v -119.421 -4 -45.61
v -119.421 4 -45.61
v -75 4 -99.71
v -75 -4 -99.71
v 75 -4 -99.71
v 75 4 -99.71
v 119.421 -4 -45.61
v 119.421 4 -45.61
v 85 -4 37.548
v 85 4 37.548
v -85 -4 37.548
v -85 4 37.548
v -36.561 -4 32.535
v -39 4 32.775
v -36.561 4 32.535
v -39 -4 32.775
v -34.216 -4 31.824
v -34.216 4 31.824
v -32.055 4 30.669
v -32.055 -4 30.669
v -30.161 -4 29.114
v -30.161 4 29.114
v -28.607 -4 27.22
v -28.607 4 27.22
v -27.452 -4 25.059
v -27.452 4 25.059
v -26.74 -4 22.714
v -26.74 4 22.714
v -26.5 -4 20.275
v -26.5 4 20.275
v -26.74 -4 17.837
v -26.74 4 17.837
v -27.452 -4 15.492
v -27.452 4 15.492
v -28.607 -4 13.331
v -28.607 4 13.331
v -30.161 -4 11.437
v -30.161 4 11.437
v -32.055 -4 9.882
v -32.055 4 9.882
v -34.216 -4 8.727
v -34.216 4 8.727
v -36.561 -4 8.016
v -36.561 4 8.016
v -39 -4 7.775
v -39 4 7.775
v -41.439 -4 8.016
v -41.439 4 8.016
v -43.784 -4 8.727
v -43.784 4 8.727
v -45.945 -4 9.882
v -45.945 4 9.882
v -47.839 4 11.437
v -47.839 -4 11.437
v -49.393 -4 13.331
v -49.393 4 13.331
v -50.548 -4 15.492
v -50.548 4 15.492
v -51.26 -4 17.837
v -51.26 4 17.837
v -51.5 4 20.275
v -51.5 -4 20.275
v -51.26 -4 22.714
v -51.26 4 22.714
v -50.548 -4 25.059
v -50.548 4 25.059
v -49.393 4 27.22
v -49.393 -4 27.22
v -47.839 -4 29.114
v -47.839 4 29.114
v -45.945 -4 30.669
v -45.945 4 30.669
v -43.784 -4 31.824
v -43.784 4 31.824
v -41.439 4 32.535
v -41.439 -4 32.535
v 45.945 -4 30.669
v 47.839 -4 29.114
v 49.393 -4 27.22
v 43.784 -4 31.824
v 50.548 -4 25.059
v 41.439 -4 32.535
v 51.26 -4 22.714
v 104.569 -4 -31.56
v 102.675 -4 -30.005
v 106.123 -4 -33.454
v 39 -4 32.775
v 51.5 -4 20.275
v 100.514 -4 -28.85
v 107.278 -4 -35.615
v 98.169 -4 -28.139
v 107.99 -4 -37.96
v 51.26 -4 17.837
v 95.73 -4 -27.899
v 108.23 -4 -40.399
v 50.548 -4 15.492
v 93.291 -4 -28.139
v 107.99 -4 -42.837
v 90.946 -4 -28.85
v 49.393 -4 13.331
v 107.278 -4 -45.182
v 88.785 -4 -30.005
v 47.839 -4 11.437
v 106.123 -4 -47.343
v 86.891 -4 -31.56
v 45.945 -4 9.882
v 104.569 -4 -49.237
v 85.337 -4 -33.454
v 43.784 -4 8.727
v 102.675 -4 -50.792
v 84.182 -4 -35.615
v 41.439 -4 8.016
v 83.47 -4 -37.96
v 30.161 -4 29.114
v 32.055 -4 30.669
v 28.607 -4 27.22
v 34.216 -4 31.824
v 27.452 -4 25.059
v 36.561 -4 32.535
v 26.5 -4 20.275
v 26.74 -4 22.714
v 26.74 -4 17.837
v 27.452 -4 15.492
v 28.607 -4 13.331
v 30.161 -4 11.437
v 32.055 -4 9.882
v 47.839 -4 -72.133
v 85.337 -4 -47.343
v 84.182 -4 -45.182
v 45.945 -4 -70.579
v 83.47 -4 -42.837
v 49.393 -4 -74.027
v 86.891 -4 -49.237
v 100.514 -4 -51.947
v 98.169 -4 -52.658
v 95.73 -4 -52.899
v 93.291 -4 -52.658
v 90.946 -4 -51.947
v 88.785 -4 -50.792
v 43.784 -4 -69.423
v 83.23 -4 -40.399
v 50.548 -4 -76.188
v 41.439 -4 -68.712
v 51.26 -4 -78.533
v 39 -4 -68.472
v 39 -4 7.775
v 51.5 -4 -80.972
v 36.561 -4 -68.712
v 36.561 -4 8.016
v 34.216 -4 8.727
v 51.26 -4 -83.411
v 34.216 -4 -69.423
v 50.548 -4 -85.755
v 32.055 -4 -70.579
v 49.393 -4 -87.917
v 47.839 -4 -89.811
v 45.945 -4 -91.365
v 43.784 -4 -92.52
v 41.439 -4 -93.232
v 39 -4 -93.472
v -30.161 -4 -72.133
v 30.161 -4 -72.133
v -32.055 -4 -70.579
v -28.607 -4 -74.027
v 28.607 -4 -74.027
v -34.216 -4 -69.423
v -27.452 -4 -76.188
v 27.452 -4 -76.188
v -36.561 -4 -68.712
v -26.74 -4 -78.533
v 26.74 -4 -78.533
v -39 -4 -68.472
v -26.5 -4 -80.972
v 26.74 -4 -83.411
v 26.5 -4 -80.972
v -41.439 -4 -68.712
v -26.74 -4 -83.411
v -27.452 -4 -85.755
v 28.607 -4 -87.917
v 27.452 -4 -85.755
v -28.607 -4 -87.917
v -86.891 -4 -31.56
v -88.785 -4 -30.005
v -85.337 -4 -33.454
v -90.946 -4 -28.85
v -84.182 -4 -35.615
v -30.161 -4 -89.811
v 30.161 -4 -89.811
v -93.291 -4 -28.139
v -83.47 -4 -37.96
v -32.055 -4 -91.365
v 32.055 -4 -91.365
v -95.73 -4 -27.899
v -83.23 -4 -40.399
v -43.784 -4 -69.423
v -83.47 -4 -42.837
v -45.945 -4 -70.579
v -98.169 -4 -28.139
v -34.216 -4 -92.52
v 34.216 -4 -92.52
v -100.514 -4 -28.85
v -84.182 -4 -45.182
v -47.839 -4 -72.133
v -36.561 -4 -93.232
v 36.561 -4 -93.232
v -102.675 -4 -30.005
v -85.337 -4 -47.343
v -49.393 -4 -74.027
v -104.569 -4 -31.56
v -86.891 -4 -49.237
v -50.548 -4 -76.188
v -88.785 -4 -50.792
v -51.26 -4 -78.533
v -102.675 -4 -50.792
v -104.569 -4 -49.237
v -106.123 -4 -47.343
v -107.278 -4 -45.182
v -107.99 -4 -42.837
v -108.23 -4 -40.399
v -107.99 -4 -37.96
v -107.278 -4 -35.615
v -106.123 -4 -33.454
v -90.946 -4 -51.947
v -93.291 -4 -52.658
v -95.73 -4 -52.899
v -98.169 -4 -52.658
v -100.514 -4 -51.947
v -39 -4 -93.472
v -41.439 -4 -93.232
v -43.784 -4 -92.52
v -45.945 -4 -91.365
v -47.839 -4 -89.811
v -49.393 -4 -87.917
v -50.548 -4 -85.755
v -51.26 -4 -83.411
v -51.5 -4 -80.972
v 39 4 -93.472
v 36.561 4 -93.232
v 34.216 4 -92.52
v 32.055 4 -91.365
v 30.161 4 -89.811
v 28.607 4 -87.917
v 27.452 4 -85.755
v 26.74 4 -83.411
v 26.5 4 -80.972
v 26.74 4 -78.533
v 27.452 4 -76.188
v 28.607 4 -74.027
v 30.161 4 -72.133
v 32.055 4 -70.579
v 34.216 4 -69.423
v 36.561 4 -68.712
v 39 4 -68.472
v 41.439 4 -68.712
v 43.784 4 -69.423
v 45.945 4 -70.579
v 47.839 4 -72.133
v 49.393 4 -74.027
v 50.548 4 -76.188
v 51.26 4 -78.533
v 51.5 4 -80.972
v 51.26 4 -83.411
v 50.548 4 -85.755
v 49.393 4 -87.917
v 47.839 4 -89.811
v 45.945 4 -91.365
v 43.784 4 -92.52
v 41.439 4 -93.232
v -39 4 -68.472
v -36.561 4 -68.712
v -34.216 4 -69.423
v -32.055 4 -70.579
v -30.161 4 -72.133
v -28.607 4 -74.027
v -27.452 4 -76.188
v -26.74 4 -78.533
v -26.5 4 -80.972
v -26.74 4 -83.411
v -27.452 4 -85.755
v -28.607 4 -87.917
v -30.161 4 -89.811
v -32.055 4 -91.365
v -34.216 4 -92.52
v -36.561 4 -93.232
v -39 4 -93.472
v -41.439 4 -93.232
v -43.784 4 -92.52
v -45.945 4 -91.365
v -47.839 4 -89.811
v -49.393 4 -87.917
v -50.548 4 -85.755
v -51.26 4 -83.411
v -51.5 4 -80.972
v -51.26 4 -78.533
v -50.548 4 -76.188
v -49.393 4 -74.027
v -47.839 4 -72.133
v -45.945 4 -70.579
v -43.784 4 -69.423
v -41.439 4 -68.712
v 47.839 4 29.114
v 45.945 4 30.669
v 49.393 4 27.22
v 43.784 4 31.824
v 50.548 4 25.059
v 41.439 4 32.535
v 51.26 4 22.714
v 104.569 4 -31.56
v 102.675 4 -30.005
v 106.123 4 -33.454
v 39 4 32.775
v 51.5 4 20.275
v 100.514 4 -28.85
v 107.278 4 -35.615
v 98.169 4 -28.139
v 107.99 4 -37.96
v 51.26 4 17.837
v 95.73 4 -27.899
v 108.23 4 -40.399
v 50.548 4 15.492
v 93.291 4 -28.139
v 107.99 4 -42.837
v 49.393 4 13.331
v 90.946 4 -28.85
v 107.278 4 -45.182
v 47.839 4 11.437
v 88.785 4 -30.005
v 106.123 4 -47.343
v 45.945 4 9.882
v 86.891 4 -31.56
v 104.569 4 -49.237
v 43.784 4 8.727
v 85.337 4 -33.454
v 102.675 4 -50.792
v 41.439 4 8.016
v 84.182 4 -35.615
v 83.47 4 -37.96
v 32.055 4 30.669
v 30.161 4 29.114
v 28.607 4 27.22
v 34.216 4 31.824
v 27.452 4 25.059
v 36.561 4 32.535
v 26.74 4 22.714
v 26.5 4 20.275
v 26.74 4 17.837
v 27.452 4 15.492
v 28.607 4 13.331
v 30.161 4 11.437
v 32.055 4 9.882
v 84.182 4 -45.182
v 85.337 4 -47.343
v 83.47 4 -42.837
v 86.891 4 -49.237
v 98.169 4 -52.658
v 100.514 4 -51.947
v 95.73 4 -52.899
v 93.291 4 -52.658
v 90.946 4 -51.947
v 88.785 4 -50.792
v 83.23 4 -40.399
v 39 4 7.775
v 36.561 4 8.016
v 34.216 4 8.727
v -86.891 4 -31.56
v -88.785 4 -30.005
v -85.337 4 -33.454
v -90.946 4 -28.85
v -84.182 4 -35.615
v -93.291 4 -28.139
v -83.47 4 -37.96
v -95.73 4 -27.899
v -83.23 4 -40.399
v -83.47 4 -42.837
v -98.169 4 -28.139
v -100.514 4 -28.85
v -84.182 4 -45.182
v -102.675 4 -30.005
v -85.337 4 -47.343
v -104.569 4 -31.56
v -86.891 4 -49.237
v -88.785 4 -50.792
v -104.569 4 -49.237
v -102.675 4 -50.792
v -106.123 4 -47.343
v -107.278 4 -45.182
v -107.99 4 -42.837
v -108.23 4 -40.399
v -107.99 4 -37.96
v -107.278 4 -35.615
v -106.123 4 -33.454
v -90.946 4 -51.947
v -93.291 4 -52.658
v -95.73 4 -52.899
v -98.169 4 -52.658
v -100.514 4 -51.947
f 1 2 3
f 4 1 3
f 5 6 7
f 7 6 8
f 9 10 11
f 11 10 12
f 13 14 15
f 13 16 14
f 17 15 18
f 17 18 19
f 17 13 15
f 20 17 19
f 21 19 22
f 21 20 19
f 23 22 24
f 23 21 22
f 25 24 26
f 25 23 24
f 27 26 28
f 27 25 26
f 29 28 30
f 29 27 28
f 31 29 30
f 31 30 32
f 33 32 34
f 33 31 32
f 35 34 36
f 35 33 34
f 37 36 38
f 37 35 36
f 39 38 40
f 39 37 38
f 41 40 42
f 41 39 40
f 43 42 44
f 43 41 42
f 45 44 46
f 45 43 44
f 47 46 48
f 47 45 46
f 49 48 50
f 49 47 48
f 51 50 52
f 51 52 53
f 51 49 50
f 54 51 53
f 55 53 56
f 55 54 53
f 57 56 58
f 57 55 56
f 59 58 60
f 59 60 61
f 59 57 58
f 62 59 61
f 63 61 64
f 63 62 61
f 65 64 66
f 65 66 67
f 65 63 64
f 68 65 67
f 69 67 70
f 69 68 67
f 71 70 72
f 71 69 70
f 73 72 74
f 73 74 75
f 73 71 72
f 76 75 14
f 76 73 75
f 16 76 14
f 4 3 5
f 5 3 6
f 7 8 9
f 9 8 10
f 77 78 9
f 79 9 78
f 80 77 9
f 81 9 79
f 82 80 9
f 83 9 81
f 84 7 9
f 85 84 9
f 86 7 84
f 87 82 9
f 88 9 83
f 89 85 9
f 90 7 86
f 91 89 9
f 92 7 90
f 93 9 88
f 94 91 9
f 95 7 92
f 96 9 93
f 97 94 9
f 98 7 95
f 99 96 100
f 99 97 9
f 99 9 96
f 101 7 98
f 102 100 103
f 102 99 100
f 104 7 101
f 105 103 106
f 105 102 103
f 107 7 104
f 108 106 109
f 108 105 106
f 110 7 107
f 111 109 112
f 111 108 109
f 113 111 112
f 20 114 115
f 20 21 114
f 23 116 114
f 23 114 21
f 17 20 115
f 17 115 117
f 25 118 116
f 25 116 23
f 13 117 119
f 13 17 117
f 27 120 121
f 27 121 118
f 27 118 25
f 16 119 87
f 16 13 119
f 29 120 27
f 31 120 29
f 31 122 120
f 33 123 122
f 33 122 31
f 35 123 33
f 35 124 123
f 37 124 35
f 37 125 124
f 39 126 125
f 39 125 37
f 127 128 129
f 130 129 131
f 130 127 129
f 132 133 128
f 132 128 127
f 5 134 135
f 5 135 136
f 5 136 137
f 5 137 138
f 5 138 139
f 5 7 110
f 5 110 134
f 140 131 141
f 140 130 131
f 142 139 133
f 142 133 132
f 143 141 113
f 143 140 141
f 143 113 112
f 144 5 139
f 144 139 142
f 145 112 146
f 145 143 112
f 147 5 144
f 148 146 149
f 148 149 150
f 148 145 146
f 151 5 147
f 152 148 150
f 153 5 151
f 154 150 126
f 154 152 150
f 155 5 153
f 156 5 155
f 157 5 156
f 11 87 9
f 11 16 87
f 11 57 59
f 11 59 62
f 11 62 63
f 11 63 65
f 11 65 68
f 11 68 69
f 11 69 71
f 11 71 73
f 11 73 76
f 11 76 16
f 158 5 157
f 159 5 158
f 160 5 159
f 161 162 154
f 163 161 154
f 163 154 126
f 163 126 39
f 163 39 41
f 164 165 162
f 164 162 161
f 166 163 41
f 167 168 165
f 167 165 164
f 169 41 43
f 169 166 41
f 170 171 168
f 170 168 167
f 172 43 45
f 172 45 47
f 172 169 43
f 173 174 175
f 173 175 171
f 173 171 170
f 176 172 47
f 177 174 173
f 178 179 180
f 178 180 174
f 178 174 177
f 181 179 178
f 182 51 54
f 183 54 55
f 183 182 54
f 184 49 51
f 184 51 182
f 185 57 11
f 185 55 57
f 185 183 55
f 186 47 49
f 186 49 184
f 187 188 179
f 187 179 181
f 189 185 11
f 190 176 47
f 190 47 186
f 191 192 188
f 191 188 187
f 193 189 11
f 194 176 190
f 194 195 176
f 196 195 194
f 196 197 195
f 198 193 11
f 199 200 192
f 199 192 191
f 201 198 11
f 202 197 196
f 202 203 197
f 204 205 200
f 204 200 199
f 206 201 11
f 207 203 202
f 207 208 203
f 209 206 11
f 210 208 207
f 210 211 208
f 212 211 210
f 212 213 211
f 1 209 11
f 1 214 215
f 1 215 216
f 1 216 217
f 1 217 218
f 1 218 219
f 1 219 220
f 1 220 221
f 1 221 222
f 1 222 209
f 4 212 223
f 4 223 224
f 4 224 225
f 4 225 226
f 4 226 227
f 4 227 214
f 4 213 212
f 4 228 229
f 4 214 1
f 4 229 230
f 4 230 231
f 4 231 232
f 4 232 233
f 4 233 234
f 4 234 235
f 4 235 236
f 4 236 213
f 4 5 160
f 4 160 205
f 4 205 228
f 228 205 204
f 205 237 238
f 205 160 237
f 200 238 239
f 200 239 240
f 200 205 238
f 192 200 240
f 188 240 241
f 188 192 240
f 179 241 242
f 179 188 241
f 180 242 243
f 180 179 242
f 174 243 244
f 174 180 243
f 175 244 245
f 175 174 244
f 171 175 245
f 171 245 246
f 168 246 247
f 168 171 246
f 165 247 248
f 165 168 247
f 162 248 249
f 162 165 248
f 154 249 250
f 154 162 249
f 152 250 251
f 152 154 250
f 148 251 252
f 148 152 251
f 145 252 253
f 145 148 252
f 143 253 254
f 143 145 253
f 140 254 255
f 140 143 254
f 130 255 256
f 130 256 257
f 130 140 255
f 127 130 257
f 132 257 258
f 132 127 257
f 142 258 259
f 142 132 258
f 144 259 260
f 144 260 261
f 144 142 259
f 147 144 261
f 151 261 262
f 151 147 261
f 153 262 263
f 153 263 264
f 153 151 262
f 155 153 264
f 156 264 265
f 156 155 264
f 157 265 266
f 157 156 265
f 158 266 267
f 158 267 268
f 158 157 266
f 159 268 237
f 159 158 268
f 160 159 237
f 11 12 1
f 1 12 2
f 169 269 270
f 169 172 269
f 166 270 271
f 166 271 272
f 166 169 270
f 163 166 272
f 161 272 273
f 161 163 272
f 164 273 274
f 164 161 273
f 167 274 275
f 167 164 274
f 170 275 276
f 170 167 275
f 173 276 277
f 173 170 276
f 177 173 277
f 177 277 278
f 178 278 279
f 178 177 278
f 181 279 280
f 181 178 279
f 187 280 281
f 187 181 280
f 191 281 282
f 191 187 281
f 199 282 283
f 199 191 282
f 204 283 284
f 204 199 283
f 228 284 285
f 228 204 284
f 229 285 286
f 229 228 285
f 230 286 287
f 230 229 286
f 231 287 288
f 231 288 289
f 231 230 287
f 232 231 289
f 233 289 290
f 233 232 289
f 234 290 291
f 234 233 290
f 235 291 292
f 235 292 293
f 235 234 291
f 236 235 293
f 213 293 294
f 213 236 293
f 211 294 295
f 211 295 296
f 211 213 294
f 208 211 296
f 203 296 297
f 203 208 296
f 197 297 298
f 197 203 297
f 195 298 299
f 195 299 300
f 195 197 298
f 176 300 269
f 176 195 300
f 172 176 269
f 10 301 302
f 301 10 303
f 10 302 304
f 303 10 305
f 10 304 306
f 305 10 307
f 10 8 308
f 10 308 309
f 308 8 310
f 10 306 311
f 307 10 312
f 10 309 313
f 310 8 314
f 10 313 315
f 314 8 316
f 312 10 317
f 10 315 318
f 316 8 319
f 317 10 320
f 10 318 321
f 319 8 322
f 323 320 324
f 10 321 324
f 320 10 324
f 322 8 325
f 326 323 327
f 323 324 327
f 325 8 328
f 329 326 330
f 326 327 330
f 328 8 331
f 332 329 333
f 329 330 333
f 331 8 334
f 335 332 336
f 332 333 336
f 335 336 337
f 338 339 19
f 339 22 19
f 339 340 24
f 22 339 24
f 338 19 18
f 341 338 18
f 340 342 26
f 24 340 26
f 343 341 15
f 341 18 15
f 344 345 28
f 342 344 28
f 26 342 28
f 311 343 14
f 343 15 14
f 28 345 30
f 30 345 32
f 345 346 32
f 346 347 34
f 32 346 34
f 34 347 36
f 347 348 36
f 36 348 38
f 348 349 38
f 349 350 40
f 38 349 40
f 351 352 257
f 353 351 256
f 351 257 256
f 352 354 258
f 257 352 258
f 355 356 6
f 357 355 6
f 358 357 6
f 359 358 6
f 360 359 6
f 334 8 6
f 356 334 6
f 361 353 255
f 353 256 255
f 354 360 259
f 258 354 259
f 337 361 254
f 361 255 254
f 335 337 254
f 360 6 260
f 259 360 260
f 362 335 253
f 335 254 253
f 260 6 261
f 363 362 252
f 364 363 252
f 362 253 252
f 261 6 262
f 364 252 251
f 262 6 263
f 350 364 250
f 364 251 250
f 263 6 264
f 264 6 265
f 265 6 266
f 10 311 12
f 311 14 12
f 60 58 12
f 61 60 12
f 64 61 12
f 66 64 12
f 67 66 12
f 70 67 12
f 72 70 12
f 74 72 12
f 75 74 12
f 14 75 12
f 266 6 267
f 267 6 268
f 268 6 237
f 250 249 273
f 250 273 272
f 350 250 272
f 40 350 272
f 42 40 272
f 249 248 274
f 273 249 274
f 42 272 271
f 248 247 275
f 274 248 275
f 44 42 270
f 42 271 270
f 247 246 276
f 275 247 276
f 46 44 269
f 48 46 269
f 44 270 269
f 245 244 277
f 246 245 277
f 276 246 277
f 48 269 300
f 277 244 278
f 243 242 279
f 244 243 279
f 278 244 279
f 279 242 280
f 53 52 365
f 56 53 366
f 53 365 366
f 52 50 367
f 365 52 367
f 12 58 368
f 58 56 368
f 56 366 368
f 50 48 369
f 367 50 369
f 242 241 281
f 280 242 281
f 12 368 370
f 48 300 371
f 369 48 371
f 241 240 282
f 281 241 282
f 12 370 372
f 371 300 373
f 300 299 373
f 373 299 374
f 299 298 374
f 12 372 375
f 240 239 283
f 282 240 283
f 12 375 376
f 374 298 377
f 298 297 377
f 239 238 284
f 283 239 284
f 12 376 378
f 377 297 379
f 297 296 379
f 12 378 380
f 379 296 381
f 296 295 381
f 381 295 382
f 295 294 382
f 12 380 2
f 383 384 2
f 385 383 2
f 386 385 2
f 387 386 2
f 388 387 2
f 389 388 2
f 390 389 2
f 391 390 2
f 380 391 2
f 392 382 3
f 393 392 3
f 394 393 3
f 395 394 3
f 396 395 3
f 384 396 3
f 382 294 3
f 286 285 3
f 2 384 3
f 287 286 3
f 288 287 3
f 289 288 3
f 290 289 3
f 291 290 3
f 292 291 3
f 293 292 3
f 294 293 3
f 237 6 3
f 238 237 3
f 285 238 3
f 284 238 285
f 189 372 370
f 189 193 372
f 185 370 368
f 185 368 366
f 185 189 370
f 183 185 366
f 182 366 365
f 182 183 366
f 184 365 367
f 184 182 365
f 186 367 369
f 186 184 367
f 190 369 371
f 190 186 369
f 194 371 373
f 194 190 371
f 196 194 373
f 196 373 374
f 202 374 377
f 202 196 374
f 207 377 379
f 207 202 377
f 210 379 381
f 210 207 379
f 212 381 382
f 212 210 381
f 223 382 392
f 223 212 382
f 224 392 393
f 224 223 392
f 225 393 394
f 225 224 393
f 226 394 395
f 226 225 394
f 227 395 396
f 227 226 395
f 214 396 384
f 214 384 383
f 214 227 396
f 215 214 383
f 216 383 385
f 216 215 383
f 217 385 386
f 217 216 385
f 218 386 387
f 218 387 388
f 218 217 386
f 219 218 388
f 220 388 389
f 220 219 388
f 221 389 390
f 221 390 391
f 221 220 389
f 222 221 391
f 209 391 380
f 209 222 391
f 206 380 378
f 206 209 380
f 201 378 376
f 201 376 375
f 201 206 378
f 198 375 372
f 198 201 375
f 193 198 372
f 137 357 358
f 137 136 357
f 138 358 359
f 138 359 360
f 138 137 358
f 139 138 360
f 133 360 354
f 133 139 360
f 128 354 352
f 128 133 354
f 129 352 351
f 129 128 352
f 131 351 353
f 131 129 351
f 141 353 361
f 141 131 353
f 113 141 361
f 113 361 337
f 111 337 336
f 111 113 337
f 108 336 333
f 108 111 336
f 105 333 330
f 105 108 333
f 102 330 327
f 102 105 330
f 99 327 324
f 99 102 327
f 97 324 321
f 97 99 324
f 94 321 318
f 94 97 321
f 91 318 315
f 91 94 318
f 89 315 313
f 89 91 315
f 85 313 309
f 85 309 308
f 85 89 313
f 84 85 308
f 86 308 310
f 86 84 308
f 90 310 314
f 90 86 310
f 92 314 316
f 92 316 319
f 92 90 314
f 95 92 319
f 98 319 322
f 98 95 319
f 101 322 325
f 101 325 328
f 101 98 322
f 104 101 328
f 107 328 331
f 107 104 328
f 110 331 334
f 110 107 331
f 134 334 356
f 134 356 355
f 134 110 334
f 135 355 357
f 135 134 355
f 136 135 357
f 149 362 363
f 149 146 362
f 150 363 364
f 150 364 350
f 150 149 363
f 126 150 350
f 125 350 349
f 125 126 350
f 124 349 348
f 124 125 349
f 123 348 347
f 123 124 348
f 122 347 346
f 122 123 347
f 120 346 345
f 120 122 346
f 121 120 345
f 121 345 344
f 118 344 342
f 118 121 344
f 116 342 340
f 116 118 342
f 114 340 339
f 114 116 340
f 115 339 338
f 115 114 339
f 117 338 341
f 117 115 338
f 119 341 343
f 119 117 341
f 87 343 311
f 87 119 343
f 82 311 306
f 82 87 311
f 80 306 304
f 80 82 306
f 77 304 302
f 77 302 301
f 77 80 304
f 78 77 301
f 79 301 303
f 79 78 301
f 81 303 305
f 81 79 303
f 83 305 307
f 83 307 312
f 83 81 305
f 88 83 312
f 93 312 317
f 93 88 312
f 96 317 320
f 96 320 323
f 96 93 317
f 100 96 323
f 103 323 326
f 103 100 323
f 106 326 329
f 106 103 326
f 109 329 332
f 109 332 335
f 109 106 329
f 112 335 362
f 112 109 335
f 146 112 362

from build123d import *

# Parameters (mm, degrees)
SKETCH_1_R      = 12.5
EXTRUDE_1_DEPTH = 4


with BuildPart() as part:
    # 草图1 → 凸台-拉伸1 (new, symmetric)
    with BuildSketch(Plane(origin=(0, 0, 0), x_dir=(1, 0, 0), z_dir=(0, 1, 0))):
        Polygon((-75, 99.709683748), (75, 99.709683748), (119.42074844, 45.609802898), (85, -37.547951261), (-85, -37.547951261), (-119.42074844, 45.609802898), align=None)
        with Locations(Location((-95.730005712, 40.398538957, 0), (0, 0, 270))):
            Circle(SKETCH_1_R, mode=Mode.SUBTRACT)
        with Locations(Location((-39, 80.971951072, 0), (0, 0, 270))):
            Circle(SKETCH_1_R, mode=Mode.SUBTRACT)
        with Locations(Location((-39, -20.275462647, 0), (0, 0, 270))):
            Circle(SKETCH_1_R, mode=Mode.SUBTRACT)
        with Locations(Location((39, -20.275462647, 0), (0, 0, 90))):
            Circle(SKETCH_1_R, mode=Mode.SUBTRACT)
        with Locations(Location((39, 80.971951072, 0), (0, 0, 90))):
            Circle(SKETCH_1_R, mode=Mode.SUBTRACT)
        with Locations(Location((95.730005712, 40.398538957, 0), (0, 0, 90))):
            Circle(SKETCH_1_R, mode=Mode.SUBTRACT)
    extrude(amount=EXTRUDE_1_DEPTH, both=True)


solid = part.part
